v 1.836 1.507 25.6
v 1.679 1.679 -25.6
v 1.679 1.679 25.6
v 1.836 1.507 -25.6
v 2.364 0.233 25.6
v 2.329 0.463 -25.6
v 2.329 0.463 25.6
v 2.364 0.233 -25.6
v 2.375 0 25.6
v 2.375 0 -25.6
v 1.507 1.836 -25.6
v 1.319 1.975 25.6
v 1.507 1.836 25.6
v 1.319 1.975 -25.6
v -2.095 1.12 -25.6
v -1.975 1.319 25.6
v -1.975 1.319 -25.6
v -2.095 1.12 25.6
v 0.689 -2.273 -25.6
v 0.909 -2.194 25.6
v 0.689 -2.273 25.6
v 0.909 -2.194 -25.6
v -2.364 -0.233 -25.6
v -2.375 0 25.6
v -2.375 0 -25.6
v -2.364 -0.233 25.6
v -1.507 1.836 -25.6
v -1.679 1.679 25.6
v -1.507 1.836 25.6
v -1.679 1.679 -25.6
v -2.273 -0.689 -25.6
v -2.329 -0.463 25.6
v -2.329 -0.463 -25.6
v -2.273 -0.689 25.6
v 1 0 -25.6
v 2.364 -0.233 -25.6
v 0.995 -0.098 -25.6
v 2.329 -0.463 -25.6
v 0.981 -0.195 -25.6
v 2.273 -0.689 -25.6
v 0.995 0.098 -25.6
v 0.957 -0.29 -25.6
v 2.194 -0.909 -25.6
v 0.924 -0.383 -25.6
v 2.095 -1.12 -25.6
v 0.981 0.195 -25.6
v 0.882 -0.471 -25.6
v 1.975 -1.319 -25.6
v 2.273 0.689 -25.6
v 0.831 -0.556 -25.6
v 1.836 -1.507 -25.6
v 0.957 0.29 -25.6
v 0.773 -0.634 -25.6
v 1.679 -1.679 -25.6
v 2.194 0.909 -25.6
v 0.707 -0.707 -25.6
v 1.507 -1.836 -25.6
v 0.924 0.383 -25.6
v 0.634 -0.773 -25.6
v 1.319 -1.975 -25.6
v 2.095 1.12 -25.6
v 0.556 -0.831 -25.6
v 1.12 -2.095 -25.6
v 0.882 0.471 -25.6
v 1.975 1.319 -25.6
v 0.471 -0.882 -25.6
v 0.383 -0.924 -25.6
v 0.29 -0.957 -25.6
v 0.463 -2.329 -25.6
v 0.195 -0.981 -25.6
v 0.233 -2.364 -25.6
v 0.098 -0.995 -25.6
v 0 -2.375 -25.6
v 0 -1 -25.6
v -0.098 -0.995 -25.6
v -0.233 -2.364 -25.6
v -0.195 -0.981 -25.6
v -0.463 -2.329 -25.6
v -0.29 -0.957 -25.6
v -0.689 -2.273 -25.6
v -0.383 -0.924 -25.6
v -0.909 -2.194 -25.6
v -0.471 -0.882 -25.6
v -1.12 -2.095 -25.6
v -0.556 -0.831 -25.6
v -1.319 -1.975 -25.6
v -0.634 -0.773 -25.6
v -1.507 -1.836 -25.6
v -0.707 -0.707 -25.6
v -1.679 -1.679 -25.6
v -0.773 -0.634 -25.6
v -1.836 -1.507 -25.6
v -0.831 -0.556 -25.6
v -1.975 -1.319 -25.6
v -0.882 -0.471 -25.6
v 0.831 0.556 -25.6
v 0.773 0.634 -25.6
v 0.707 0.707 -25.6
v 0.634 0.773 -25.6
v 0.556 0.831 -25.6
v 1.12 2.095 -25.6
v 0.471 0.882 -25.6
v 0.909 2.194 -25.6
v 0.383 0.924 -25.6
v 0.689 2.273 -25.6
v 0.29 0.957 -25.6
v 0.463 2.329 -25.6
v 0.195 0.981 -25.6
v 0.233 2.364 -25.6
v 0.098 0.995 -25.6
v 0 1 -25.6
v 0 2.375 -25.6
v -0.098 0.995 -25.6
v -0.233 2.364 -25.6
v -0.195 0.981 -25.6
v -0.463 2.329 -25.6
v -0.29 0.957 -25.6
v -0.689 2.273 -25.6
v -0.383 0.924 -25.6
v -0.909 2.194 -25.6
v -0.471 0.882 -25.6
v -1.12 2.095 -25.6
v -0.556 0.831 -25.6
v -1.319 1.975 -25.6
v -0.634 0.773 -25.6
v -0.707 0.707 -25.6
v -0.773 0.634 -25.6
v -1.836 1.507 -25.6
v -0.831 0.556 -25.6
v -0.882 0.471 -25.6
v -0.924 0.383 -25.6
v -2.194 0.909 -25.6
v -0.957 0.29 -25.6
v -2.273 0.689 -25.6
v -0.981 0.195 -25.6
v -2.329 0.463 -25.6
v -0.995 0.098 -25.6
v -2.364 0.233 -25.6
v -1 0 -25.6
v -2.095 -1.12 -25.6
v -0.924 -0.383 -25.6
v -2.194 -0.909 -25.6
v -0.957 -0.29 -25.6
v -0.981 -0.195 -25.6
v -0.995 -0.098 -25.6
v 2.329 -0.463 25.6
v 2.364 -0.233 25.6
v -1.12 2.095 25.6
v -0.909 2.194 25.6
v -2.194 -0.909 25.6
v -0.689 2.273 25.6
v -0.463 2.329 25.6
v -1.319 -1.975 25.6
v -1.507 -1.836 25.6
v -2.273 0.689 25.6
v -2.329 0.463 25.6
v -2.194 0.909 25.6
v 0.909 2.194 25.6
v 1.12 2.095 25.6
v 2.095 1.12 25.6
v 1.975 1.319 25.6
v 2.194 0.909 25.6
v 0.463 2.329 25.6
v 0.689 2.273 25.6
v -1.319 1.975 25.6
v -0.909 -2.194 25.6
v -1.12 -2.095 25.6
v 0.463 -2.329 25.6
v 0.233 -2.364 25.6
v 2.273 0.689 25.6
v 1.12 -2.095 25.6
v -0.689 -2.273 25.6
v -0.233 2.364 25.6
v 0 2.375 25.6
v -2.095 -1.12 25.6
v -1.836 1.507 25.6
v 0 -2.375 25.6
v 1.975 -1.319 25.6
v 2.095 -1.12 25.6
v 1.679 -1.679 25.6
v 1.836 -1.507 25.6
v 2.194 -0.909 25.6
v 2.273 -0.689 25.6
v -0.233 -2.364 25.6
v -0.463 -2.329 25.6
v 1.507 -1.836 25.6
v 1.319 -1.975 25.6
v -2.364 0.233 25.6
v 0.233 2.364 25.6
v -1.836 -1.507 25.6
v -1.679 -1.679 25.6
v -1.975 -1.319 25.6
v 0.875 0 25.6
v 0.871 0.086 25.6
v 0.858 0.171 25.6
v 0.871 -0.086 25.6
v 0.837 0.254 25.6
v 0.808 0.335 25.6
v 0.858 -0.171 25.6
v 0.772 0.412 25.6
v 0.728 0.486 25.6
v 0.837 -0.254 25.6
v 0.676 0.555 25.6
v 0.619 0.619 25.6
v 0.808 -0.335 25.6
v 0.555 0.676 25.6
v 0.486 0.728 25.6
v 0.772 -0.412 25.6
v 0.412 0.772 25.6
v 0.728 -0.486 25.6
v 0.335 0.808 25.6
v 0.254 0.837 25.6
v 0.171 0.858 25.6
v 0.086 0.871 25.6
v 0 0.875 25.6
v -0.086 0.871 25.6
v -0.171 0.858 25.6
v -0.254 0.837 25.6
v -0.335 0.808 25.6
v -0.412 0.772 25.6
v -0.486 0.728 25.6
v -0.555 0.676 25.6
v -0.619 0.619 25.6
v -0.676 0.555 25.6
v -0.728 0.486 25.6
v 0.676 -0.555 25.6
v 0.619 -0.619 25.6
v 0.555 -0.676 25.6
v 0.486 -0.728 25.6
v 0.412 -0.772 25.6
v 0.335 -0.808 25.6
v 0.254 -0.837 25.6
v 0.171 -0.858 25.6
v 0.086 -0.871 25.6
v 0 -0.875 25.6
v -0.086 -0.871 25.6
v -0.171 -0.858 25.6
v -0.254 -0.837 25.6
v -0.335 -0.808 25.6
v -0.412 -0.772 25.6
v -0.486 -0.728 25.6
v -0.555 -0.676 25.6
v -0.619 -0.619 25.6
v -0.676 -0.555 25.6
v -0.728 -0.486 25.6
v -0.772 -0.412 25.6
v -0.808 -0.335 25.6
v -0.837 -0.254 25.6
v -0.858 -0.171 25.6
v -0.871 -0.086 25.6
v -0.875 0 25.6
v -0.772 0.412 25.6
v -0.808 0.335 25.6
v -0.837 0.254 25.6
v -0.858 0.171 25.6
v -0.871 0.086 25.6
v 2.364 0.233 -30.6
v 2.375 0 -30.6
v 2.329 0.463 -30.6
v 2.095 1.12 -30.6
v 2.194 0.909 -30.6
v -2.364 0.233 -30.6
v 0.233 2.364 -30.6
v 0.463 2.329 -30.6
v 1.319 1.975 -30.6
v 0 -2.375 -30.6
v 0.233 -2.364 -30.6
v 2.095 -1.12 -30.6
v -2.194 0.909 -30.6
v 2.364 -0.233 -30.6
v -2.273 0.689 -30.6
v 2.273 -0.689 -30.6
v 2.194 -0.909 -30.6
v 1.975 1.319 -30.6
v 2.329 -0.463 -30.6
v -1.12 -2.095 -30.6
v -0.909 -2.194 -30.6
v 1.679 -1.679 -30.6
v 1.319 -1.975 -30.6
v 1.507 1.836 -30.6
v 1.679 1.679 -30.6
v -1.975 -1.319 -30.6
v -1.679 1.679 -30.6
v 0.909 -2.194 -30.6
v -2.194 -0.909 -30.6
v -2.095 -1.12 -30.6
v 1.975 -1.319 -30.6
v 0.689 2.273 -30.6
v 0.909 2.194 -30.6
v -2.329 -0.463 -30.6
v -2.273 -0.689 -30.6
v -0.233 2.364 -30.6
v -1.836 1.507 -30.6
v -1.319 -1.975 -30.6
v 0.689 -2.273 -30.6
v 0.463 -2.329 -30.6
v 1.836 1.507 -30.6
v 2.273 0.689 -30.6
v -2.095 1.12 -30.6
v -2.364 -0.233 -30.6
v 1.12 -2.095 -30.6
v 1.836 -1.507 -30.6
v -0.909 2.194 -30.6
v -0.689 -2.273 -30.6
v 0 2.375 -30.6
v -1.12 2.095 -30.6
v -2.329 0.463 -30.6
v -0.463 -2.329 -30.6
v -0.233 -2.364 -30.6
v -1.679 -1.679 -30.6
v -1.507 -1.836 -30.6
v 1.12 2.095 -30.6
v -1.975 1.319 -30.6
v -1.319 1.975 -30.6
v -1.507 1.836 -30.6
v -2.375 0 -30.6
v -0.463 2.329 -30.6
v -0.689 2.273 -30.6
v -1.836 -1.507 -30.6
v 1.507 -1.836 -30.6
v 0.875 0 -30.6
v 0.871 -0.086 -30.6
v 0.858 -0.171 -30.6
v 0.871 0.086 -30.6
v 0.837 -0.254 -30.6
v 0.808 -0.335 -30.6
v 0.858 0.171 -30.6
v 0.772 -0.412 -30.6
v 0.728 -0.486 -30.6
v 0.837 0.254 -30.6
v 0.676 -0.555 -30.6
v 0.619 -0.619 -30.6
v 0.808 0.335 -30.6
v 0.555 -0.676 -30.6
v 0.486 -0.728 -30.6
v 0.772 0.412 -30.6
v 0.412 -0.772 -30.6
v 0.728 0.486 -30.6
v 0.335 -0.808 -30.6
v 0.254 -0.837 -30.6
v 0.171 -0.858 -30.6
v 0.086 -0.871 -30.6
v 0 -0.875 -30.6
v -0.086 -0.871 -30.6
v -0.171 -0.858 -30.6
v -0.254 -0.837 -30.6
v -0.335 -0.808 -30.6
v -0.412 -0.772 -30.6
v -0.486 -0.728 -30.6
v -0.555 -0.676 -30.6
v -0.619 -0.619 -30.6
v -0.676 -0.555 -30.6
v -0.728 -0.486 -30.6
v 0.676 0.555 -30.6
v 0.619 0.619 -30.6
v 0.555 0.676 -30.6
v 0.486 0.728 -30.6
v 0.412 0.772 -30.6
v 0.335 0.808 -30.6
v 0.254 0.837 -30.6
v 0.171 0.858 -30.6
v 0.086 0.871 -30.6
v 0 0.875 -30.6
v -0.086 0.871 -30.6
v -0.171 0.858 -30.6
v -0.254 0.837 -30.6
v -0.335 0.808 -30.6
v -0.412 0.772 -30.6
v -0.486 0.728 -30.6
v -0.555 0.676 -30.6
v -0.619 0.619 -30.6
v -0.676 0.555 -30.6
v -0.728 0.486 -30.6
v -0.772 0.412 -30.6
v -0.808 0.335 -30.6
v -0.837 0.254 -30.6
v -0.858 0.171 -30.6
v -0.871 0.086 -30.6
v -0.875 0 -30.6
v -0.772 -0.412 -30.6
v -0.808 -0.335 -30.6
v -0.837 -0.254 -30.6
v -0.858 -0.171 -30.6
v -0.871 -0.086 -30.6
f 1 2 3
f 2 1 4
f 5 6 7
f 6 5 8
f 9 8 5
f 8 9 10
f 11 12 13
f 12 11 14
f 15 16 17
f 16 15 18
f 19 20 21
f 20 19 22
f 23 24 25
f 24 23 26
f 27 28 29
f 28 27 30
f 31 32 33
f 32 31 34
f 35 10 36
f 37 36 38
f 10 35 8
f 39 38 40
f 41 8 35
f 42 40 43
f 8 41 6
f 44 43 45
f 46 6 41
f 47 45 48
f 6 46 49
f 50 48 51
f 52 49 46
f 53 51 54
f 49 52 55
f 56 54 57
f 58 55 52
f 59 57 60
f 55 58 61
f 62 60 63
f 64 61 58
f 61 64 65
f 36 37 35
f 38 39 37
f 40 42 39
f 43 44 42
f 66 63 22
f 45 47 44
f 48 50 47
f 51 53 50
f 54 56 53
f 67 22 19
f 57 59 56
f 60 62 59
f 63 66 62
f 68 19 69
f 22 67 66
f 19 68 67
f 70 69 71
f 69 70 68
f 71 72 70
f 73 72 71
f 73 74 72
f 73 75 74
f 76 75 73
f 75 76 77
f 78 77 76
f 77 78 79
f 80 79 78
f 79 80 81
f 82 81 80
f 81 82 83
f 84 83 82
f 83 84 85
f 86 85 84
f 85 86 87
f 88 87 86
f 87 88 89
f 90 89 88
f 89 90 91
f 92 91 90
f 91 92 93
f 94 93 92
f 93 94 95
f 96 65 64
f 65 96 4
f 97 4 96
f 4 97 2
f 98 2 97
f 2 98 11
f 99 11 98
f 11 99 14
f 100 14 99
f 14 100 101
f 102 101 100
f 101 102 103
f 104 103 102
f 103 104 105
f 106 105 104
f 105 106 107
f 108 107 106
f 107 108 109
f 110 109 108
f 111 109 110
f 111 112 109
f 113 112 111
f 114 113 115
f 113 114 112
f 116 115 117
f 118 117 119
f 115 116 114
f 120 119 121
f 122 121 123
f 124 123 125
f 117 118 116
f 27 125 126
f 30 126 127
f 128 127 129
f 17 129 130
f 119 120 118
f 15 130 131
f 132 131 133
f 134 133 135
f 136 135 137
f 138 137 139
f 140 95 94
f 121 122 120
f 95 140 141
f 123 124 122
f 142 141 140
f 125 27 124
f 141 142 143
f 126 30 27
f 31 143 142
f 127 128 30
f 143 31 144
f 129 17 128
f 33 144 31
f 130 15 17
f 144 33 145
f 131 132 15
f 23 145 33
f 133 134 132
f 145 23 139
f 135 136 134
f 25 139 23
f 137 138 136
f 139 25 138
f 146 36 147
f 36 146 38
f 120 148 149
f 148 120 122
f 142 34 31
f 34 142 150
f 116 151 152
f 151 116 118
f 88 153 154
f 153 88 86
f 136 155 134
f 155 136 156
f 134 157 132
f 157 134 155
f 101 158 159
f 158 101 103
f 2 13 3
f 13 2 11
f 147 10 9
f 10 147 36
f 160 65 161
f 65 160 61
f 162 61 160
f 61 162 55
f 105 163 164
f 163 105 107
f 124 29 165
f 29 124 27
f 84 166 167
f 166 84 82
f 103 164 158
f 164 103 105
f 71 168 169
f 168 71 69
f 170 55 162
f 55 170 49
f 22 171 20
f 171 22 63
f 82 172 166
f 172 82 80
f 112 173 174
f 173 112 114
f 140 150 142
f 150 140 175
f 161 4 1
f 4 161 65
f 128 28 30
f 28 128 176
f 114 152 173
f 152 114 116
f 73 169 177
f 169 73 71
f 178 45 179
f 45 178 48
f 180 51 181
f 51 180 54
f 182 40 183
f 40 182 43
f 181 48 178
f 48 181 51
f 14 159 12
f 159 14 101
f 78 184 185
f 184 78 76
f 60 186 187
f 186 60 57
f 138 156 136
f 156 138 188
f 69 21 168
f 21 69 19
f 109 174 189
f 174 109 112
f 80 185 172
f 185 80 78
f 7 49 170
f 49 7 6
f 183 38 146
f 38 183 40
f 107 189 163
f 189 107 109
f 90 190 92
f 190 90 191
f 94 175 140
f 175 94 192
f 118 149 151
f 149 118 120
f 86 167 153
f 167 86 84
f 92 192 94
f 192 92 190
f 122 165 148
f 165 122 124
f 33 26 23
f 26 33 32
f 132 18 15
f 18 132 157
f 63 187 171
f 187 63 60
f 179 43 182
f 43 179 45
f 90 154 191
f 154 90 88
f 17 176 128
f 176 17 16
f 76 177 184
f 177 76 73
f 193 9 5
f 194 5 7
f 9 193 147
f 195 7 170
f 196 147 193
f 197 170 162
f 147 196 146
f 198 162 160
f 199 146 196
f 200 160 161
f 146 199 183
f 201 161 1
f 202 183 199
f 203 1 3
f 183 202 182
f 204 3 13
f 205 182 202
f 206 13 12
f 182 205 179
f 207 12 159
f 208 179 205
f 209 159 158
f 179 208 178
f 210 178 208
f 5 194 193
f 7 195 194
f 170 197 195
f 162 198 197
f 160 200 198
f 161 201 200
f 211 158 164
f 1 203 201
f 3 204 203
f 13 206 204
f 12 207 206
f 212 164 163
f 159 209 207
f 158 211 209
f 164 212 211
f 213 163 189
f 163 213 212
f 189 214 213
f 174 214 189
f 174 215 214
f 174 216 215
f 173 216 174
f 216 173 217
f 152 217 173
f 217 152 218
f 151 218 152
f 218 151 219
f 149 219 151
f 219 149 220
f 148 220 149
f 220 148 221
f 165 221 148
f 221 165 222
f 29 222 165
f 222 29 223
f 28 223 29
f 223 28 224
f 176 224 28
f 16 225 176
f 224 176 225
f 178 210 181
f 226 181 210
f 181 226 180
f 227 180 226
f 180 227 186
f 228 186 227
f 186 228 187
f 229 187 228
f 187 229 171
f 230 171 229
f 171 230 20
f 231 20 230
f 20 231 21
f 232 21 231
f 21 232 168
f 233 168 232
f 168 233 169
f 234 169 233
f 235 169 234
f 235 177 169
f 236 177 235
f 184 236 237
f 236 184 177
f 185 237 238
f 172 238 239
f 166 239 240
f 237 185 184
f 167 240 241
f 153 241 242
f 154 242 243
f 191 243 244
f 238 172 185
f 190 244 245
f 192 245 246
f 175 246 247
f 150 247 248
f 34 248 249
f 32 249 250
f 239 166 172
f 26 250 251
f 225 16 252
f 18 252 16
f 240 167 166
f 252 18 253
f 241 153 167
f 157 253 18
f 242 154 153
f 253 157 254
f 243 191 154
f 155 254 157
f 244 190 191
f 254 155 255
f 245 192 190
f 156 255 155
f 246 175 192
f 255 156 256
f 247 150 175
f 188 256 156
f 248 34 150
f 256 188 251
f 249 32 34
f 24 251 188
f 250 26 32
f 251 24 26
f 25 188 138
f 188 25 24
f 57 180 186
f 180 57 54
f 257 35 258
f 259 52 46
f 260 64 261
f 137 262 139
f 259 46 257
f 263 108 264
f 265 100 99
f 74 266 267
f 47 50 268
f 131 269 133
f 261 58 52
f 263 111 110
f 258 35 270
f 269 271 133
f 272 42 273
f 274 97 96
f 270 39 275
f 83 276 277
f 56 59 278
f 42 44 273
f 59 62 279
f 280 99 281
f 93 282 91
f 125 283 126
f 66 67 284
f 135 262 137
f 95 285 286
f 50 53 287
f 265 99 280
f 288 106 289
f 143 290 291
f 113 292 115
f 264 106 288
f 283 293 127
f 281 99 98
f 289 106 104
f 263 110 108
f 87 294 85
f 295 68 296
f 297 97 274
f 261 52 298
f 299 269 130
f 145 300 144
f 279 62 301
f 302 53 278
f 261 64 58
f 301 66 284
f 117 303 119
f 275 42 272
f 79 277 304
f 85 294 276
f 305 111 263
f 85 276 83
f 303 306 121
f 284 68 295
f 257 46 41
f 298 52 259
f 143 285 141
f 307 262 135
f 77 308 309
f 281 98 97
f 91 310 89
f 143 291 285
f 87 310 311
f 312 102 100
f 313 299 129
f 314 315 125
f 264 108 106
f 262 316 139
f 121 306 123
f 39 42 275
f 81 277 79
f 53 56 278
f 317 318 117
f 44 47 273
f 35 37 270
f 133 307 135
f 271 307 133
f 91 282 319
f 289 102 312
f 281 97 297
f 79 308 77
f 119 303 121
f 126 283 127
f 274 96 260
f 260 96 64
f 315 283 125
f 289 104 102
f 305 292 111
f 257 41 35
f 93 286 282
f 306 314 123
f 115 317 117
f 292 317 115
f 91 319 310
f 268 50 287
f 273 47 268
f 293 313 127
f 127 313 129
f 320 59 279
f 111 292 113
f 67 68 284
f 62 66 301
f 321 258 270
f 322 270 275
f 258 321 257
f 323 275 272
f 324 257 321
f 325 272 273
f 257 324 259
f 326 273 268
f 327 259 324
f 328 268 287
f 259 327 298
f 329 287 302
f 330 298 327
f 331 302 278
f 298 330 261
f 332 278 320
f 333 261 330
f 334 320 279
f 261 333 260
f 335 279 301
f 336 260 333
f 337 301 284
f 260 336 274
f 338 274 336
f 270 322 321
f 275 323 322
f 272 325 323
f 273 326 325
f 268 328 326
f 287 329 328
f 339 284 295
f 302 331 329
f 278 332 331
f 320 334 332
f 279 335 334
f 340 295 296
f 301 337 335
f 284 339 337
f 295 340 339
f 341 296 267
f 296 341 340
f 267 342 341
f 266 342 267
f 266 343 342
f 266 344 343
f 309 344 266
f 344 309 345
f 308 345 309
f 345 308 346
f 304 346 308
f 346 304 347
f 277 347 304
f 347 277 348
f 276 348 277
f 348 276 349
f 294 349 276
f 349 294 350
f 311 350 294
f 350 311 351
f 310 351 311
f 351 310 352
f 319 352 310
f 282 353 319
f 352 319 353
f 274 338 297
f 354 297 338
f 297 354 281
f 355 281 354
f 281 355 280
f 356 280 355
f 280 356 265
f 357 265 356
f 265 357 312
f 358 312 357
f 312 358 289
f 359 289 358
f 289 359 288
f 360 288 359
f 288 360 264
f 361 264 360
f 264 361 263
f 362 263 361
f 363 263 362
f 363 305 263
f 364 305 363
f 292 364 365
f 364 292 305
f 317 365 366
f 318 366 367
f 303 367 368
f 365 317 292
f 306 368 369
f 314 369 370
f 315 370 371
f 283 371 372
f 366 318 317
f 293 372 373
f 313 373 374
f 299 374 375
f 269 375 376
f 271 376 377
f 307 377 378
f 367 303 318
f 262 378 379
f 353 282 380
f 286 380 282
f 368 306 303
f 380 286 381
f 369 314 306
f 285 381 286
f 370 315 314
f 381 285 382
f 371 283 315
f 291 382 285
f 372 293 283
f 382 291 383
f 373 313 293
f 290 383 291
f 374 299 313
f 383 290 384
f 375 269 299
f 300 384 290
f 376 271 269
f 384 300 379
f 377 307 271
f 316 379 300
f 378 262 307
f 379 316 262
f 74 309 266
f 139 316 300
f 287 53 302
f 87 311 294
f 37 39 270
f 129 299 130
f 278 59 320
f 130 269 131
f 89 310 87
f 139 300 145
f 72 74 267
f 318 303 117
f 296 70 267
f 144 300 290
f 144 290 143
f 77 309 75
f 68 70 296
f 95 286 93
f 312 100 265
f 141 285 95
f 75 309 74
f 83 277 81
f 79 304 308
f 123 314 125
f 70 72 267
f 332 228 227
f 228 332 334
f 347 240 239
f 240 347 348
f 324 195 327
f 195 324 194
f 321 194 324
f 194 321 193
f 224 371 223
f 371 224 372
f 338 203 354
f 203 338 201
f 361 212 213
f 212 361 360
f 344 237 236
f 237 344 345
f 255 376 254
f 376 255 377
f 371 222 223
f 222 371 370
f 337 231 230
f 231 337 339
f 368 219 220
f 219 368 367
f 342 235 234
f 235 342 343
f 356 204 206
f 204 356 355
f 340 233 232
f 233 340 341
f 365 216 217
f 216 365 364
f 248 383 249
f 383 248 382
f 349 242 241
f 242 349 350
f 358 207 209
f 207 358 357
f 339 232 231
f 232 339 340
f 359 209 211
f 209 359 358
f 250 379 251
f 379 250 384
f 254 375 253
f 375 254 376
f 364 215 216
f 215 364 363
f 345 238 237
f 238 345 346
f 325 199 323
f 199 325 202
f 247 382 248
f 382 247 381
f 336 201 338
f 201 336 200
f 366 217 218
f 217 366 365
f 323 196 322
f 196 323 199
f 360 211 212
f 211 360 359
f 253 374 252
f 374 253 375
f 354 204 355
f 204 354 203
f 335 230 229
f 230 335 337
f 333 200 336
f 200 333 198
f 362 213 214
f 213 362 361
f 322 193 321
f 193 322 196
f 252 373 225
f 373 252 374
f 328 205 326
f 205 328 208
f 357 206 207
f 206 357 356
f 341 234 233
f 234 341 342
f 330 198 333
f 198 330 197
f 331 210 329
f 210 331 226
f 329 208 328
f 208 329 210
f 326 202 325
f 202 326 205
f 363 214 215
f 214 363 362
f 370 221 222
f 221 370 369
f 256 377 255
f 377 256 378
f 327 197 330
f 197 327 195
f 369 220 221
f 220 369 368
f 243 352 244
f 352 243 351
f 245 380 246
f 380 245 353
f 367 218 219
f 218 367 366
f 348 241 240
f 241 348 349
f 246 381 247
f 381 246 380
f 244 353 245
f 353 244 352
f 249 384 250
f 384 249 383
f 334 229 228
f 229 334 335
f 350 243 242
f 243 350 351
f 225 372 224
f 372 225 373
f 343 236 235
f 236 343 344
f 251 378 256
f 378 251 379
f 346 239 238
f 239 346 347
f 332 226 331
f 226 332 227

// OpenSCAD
module hot_end() {
    difference() {
        union() {
            // Barrel
            translate([0, 0, -25.6])
                cylinder(h=51.2, d=4.75, $fn=64);
            // Nozzle
            translate([0, 0, -30.6])
                cylinder(h=5, d1=4.75, d2=2, $fn=64);
        }
        // Filament path
        translate([0, 0, -30.6])
            cylinder(h=56.2, d=1.75, $fn=64);
    }
}

hot_end();
